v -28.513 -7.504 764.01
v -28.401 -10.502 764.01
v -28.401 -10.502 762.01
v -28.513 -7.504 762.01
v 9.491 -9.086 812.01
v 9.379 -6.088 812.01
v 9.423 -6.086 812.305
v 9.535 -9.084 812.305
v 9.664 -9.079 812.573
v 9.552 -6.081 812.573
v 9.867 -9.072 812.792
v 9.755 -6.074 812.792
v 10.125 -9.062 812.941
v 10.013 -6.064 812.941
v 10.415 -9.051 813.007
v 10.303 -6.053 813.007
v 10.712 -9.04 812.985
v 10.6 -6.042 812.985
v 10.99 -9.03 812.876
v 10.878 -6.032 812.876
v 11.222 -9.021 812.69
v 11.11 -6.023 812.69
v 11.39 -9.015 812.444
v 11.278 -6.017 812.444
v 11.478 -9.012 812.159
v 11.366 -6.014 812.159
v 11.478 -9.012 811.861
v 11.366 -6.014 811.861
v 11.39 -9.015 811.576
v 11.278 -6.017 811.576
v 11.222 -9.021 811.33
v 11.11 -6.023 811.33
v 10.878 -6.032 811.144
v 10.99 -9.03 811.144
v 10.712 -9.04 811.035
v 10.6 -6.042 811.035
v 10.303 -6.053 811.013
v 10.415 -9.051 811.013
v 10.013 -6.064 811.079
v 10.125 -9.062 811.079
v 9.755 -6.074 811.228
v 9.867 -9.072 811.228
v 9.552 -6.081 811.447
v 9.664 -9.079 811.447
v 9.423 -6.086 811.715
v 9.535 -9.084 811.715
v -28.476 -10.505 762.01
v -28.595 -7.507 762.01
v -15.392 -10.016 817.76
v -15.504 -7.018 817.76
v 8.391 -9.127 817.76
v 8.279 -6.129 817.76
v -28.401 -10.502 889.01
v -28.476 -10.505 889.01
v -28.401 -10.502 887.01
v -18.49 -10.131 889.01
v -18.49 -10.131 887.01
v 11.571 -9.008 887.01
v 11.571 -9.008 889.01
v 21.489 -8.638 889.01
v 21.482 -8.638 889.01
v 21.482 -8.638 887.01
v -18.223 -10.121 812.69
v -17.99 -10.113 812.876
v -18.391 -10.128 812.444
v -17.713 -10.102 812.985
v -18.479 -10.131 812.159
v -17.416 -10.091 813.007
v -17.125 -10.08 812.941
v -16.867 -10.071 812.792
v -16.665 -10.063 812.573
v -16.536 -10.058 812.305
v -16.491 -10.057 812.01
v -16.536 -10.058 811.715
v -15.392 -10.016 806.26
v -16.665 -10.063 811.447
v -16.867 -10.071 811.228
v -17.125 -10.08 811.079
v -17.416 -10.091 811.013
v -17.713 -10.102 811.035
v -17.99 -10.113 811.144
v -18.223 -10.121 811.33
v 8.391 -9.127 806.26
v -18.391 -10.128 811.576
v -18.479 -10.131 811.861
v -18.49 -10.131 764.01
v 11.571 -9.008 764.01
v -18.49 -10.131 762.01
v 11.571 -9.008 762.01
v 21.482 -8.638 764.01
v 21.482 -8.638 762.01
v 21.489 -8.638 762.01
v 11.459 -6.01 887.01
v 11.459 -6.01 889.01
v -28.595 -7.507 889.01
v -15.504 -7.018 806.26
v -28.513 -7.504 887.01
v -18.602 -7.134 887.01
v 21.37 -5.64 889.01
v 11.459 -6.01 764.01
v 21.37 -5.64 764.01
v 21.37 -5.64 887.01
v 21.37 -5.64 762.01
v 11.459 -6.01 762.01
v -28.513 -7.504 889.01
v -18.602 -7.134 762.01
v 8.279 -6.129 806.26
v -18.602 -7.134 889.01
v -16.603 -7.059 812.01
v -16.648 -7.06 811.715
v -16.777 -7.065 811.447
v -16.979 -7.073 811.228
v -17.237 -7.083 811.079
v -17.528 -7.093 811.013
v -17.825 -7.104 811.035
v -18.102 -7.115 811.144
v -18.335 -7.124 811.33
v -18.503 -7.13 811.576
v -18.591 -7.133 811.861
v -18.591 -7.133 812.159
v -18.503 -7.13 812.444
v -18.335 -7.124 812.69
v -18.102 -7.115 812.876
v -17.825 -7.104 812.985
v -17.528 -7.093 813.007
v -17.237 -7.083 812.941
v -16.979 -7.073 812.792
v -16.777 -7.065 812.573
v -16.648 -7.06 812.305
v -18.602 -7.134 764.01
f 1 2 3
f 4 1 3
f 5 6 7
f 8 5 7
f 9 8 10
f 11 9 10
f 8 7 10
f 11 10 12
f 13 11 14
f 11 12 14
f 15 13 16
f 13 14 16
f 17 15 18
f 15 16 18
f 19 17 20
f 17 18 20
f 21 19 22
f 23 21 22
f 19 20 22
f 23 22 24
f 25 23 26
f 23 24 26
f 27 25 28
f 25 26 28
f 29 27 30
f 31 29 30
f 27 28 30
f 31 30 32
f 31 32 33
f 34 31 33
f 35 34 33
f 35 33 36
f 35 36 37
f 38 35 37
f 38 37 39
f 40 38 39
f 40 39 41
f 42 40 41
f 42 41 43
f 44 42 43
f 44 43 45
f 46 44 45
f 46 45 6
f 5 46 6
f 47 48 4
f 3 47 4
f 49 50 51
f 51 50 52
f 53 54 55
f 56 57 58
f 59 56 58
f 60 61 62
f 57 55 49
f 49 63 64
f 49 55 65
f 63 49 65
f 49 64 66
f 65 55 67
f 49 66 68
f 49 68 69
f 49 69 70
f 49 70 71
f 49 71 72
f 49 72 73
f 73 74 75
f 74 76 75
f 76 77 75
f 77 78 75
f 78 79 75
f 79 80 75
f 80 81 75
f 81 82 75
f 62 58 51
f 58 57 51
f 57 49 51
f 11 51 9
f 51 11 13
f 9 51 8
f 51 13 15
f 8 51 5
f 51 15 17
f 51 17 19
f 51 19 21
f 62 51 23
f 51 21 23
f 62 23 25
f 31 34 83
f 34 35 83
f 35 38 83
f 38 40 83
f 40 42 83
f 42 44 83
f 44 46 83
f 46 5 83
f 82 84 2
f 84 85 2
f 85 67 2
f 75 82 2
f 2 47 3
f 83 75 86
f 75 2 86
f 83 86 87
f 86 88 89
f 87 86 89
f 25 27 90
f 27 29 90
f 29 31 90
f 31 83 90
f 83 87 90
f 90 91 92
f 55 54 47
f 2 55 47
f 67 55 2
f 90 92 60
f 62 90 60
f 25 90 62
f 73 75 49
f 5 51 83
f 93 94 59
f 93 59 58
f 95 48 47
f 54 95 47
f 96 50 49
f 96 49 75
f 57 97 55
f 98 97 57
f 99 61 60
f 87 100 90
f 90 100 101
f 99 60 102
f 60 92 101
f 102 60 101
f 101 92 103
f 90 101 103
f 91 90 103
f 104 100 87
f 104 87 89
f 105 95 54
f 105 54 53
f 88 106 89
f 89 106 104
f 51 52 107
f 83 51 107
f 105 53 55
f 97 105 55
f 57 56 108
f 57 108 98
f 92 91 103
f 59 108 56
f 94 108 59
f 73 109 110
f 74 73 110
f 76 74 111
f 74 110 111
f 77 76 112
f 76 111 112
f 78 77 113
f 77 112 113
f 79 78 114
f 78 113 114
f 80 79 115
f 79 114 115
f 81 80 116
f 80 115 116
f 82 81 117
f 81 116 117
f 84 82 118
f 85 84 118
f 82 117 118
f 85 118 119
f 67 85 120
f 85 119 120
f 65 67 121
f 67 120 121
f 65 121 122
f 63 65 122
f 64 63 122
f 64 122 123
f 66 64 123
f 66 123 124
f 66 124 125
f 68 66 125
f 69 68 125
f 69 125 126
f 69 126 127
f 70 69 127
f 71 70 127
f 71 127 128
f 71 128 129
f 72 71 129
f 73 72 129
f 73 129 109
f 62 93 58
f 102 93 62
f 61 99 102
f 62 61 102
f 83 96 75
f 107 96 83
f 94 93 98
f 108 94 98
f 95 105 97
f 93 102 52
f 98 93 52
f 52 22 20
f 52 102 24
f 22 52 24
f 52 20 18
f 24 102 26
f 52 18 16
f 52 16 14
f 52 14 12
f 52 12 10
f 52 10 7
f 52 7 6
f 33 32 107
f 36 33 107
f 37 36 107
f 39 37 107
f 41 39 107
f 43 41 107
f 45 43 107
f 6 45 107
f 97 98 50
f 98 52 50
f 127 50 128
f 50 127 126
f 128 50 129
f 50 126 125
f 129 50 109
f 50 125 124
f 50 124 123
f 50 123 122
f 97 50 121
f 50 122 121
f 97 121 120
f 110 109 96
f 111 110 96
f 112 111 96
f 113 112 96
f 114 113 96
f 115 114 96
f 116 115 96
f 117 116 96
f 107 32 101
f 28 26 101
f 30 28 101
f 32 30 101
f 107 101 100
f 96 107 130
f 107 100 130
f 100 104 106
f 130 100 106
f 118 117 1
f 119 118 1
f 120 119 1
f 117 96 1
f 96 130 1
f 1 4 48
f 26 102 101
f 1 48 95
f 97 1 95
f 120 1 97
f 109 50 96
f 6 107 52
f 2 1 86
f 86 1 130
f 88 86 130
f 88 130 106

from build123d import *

# Parameters (mm, degrees)
EXTRUDE_1_DEPTH     = 127
SKETCH_3_W          = 9.917998233
SKETCH_3_H          = 2
CUT_EXTRUDE_1_DEPTH = 890.48684692
SKETCH_4_R          = 1
SKETCH_4_W          = 23.8
SKETCH_4_H          = 11.5
CUT_EXTRUDE_2_DEPTH = 890.48684692


with BuildPart() as part:
    # 草图2 → 凸台-拉伸1 (new body)
    with BuildSketch(Plane(origin=(0, 0, 762.01), x_dir=(-1, 0, 0), z_dir=(0, 0, -1))):
        Polygon((-21.370258024, -5.639890041), (28.594871448, -7.506929626), (28.475974915, -10.504572636), (-21.489154557, -8.637533051), align=None)
    extrude(amount=-EXTRUDE_1_DEPTH)

    # 草图3 → 切除-拉伸1 (cut, through all)
    with BuildSketch(Plane(origin=(0.240248379, -6.429451979, 0), x_dir=(0.9993025894470269, 0.03734079169577059, 0), z_dir=(-0.03734079169577059, 0.9993025894470269, 0))):
        with Locations((-23.814242896, -763.01)):
            Rectangle(SKETCH_3_W, SKETCH_3_H)
        with Locations((16.185757105, -763.01)):
            Rectangle(SKETCH_3_W, SKETCH_3_H)
        with Locations((-23.814242896, -888.01)):
            Rectangle(SKETCH_3_W, SKETCH_3_H)
        with Locations((16.185757105, -888.01)):
            Rectangle(SKETCH_3_W, SKETCH_3_H)
    extrude(amount=-CUT_EXTRUDE_1_DEPTH, mode=Mode.SUBTRACT)

    # 草图4 → 切除-拉伸2 (cut, through all)
    with BuildSketch(Plane(origin=(0.240248379, -6.429451979, 0), x_dir=(0.9993025894470269, 0.03734079169577059, 0), z_dir=(-0.03734079169577059, 0.9993025894470269, 0))):
        with Locations(Location((10.144756221, -812.01, 0), (0, 0, 180))):
            Circle(SKETCH_4_R)
        with Locations((-17.855243779, -812.01)):
            Circle(SKETCH_4_R)
        with Locations((-3.855243779, -812.01)):
            Rectangle(SKETCH_4_W, SKETCH_4_H)
    extrude(amount=-CUT_EXTRUDE_2_DEPTH, mode=Mode.SUBTRACT)


solid = part.part
